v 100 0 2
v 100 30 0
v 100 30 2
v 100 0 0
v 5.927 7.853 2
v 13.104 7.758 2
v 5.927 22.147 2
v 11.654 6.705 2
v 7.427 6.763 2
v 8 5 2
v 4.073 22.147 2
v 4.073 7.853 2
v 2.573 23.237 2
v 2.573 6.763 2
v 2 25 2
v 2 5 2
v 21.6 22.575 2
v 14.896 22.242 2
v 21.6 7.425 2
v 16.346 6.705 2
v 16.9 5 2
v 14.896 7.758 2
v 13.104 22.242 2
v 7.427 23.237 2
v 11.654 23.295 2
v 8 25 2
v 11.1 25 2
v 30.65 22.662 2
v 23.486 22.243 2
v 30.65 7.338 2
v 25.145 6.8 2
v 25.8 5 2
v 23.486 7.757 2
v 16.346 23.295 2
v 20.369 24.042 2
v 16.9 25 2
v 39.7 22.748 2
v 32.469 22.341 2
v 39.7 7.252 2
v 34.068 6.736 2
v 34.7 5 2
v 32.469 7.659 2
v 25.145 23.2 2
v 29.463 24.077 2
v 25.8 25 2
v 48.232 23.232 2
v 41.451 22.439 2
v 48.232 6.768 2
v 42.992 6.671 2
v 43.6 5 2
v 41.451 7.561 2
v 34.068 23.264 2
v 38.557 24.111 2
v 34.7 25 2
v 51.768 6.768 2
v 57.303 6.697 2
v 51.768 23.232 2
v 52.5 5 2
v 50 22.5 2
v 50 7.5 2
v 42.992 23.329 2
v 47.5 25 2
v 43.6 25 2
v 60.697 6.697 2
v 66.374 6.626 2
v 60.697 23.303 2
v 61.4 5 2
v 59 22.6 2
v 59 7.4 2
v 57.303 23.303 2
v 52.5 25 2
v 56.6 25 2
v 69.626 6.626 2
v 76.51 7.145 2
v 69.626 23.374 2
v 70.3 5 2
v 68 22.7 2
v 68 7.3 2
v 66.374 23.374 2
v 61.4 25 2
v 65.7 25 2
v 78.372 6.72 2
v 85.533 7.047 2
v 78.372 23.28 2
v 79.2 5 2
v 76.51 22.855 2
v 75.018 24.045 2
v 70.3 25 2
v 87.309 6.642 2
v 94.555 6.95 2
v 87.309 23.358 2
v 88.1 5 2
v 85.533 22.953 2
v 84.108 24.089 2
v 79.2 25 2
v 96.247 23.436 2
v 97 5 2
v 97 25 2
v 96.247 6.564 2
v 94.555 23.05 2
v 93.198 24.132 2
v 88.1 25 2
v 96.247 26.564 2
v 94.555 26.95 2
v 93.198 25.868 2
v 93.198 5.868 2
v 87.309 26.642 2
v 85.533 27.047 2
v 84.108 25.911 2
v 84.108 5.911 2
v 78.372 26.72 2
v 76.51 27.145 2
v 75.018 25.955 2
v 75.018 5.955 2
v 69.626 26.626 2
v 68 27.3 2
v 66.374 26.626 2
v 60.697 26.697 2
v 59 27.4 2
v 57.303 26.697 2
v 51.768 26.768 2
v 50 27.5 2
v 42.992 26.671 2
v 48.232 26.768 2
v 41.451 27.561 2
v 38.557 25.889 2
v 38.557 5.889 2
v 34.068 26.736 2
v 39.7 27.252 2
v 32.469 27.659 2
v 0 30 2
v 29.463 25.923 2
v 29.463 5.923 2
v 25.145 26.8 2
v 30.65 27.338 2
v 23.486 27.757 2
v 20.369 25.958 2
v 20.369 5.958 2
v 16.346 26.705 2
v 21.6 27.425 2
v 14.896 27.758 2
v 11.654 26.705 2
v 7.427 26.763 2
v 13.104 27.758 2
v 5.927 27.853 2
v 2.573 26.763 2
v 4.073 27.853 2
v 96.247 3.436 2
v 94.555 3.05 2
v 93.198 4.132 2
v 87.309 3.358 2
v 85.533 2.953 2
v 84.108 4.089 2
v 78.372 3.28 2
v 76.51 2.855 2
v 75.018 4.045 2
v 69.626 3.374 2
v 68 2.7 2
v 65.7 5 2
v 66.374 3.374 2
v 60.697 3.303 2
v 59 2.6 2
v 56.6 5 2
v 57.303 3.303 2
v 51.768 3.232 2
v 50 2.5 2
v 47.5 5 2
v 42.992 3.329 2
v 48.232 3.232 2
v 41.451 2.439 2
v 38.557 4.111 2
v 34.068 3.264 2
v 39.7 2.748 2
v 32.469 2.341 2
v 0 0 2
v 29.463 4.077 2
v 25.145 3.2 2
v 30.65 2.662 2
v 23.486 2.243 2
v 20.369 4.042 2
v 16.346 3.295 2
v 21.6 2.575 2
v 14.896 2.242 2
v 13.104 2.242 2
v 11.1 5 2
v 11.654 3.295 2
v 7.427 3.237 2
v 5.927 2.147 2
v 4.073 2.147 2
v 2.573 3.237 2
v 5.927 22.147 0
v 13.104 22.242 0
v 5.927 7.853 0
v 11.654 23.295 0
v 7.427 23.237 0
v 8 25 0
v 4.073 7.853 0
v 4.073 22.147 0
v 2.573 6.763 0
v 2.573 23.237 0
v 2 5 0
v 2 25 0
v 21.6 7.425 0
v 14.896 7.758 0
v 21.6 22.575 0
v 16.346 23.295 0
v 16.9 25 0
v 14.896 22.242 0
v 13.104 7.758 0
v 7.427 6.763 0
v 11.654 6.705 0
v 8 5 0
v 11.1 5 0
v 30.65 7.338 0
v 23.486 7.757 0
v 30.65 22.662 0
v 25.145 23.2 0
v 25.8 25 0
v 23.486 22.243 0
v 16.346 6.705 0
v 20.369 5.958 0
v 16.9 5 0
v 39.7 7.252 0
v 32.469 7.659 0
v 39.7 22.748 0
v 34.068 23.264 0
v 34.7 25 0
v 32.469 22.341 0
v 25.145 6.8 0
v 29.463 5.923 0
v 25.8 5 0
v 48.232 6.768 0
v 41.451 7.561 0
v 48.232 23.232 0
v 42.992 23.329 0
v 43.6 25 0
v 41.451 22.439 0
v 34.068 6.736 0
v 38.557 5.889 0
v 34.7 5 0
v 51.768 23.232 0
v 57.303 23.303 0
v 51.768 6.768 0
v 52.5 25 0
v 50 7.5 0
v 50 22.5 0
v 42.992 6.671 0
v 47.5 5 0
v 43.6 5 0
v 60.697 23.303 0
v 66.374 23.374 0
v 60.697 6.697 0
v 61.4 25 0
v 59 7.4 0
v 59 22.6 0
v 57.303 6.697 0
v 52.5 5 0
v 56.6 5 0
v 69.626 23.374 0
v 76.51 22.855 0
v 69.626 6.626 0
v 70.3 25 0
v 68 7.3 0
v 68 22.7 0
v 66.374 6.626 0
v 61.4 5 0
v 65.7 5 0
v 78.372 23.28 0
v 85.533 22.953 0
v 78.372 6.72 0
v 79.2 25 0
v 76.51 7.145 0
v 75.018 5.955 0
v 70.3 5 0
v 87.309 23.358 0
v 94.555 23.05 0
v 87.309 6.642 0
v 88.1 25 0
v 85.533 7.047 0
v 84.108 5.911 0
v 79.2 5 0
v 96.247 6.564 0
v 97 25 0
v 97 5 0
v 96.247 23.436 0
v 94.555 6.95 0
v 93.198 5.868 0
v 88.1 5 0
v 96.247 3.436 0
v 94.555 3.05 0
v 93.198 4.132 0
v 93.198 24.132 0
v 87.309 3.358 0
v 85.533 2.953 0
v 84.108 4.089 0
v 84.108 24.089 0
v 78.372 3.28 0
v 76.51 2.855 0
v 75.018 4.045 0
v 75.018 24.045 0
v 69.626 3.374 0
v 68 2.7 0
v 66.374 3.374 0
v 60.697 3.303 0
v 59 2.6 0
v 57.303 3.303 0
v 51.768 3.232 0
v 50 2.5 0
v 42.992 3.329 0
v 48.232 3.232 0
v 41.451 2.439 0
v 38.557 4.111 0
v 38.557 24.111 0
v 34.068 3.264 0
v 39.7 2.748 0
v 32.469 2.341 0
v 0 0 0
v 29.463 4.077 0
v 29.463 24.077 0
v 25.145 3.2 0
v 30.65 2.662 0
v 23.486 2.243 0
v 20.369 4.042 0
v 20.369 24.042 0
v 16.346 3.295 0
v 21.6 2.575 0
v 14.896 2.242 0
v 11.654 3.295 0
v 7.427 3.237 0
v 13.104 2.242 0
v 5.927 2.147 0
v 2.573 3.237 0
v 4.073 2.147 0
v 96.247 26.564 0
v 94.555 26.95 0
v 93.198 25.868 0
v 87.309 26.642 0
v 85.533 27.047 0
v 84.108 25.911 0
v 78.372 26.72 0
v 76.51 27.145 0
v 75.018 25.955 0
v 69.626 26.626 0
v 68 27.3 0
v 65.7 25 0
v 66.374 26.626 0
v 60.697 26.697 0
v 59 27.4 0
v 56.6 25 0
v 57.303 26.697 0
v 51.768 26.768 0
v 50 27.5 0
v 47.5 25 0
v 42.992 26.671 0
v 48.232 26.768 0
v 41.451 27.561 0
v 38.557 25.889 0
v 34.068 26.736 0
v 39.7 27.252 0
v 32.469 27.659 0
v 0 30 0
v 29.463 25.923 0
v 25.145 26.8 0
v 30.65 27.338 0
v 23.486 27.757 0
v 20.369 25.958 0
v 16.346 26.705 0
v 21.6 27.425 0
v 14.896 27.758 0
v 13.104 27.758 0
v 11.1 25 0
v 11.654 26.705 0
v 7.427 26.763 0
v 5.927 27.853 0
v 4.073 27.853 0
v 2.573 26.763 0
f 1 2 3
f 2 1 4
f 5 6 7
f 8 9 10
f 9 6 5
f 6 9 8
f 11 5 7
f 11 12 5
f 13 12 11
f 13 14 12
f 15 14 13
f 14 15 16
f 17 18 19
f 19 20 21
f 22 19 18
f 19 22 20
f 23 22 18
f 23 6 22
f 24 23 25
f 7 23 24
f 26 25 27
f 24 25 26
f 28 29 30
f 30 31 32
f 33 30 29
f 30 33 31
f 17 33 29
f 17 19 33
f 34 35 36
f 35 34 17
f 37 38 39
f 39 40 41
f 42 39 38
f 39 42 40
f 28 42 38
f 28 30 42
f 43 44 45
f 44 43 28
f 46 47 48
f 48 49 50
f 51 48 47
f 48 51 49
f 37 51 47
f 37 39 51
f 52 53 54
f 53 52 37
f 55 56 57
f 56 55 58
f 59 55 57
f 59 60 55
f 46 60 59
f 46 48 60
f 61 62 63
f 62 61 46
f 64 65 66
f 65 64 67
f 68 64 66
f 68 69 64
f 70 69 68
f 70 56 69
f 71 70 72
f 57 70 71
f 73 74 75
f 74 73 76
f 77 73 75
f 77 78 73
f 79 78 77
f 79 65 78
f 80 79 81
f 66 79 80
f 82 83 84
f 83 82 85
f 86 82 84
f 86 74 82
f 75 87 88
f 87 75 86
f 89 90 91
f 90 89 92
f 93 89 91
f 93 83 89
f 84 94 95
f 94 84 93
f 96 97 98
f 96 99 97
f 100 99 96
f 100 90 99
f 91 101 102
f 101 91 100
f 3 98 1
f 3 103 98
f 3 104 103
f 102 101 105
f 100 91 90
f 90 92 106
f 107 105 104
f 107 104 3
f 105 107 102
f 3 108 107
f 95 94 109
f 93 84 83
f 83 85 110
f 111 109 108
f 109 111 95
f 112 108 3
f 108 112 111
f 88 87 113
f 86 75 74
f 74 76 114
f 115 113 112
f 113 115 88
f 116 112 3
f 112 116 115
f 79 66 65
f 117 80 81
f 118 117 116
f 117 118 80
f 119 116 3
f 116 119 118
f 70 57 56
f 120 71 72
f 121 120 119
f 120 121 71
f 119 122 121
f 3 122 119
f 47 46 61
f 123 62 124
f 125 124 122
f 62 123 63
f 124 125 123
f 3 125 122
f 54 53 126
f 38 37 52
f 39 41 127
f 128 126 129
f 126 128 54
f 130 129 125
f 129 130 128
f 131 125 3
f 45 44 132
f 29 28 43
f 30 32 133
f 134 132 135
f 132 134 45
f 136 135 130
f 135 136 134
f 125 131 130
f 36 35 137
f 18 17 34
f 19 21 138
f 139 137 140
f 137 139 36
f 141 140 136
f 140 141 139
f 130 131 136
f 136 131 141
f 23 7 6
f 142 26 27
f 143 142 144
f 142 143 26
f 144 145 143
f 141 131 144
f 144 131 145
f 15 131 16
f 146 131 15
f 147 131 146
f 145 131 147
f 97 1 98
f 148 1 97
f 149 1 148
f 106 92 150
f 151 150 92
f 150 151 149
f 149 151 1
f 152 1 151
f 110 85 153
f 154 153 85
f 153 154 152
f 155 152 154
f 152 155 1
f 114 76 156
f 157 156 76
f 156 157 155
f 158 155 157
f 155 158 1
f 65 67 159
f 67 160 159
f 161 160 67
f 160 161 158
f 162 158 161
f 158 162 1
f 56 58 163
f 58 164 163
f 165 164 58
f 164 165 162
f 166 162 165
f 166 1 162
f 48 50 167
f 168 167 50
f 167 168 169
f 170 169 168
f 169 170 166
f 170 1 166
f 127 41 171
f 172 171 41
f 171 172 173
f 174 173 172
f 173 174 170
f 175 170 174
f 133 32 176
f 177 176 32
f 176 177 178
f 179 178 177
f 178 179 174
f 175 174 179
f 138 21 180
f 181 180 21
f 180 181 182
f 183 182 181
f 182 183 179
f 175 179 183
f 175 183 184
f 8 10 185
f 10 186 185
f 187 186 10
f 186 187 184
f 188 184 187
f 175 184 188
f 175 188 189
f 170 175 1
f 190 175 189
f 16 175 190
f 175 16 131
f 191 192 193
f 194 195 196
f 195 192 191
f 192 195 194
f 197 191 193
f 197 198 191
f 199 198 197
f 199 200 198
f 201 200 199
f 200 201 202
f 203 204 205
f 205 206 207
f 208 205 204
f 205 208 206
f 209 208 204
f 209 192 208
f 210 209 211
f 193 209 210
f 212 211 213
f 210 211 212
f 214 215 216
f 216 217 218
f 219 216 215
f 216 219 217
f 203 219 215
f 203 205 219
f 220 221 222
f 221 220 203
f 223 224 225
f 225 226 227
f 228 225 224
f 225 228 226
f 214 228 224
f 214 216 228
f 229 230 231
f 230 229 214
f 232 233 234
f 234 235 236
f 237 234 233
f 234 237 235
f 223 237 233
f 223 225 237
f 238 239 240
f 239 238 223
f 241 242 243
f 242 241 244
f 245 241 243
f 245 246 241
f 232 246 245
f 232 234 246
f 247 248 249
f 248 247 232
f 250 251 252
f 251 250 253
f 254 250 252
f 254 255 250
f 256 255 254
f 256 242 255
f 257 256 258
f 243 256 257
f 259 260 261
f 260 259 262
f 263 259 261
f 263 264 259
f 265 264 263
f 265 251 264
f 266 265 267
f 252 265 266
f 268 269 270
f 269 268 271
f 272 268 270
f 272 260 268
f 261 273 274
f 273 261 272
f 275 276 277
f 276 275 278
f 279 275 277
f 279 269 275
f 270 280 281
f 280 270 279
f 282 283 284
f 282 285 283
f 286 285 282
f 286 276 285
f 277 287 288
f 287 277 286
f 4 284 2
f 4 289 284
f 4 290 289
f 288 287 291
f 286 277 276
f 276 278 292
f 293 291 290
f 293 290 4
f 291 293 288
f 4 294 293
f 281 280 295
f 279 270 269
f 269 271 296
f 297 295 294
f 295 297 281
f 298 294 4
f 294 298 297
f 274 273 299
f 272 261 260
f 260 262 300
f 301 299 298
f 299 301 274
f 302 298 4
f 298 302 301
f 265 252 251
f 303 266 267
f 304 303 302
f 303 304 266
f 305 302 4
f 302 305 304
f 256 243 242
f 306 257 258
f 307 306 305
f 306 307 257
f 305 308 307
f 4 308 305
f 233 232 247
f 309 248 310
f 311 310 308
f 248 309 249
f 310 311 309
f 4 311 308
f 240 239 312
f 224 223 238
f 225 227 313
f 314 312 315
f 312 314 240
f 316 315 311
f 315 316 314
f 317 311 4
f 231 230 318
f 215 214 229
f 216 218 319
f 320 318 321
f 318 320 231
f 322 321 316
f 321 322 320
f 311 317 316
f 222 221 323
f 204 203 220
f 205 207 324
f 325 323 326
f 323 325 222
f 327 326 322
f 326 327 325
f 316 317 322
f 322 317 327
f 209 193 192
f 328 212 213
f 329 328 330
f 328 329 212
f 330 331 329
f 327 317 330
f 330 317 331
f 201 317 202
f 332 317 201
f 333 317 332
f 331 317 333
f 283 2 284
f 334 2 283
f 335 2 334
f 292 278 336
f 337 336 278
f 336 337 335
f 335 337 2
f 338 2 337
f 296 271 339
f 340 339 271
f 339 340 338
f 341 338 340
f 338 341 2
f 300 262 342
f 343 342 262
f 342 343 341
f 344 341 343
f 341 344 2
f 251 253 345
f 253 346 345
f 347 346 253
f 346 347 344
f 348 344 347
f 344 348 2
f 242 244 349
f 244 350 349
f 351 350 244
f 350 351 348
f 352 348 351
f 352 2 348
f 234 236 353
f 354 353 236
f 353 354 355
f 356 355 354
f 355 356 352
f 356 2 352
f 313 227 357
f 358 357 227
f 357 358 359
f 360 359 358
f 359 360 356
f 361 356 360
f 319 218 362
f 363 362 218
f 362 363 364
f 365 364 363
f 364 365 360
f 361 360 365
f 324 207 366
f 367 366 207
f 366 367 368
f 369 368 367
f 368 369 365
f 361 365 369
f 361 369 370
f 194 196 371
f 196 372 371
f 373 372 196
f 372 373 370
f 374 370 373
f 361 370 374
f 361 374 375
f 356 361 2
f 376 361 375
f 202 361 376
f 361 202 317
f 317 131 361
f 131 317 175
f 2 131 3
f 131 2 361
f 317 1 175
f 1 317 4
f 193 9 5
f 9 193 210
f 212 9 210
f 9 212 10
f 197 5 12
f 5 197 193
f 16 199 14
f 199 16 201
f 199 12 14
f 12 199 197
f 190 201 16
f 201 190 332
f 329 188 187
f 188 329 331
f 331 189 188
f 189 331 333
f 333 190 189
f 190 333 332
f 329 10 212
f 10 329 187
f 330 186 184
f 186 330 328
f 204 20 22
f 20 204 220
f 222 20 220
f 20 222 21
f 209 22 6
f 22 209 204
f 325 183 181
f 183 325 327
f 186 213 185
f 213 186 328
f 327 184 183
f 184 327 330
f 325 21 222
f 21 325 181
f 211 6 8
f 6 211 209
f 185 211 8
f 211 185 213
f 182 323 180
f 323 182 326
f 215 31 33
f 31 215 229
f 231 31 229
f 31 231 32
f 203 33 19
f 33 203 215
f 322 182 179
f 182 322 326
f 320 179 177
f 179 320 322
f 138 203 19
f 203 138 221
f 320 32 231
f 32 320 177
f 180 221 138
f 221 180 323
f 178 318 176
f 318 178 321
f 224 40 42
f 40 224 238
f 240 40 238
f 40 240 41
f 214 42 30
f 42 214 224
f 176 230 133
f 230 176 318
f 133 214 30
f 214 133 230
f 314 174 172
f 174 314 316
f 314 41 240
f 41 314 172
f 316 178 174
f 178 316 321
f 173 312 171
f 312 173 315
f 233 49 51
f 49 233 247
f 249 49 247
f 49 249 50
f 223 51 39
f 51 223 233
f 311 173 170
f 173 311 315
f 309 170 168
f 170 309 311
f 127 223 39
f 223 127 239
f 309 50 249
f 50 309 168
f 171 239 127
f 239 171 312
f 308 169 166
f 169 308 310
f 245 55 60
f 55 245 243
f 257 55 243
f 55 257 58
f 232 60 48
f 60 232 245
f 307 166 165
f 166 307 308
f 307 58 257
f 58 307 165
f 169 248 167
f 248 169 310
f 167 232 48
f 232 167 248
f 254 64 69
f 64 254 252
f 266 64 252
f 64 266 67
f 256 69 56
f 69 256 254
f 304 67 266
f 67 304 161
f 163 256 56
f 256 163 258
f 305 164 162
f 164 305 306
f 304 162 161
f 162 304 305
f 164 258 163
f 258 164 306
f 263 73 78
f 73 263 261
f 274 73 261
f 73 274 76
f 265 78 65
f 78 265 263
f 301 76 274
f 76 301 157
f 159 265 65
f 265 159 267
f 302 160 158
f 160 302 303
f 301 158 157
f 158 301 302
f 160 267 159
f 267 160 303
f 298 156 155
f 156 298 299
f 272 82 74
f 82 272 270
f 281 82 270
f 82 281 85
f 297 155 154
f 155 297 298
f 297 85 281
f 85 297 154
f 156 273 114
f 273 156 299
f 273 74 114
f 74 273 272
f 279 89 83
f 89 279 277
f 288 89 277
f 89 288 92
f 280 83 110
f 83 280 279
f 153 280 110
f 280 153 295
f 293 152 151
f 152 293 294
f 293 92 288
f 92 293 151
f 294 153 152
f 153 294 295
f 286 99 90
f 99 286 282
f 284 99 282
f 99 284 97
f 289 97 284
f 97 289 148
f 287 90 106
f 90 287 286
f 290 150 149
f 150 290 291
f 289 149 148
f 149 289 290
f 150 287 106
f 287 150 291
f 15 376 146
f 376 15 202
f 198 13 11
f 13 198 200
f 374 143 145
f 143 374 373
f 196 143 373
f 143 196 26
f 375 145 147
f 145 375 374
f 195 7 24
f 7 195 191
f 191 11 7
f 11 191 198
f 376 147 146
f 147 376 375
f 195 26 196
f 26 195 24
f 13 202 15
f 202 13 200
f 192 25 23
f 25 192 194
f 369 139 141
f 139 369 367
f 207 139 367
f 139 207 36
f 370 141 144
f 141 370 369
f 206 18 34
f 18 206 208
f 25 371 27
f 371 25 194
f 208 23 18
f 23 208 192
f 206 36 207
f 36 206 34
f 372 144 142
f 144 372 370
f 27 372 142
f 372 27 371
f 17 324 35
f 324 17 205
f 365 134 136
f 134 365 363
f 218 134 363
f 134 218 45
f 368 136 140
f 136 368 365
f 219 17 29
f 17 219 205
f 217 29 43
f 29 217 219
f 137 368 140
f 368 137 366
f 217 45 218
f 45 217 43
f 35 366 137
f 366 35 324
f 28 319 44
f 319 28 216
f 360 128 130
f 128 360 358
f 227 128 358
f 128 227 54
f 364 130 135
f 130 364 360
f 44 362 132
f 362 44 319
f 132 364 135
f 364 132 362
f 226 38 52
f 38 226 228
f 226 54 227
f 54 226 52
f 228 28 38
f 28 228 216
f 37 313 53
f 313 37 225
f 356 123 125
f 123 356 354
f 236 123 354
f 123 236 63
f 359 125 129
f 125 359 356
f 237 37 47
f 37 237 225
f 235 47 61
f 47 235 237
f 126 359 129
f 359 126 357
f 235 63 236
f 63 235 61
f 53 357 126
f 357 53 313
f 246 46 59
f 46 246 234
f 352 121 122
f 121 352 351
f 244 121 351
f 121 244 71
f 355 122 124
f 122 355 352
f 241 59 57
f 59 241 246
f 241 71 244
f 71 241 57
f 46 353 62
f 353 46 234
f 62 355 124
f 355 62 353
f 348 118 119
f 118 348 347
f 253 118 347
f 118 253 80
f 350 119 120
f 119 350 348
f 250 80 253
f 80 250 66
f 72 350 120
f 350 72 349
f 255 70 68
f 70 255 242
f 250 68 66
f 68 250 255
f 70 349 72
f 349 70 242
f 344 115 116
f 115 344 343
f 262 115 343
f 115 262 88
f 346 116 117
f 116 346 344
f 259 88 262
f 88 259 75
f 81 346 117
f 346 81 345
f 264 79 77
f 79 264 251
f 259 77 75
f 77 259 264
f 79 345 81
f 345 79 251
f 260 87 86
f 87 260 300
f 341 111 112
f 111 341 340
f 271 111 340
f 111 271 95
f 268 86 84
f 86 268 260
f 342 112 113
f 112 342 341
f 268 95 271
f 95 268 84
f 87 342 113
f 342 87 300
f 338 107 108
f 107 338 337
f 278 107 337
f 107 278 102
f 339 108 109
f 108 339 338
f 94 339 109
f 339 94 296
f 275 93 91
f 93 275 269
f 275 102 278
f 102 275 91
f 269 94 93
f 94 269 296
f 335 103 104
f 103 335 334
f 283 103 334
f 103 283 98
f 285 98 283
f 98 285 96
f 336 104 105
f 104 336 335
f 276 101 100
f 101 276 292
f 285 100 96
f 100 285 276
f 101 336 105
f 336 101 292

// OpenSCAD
difference(){

cube([100,30,2]);

translate([5,5,-1])
cylinder(3,3,3);

translate([14,5,-1])
cylinder(3,2.9,2.9);

translate([23,5,-1])
cylinder(3,2.8,2.8);

translate([32,5,-1])
cylinder(3,2.7,2.7);

translate([41,5,-1])
cylinder(3,2.6,2.6);

translate([50,5,-1])
cylinder(3,2.5,2.5);

translate([59,5,-1])
cylinder(3,2.4,2.4);

translate([68,5,-1])
cylinder(3,2.3,2.3);

translate([77,5,-1])
cylinder(3,2.2,2.2);

translate([86,5,-1])
cylinder(3,2.1,2.1);

translate([95,5,-1])
cylinder(3,2,2);


translate([5,25,-1])
cylinder(3,3,3);

translate([14,25,-1])
cylinder(3,2.9,2.9);

translate([23,25,-1])
cylinder(3,2.8,2.8);

translate([32,25,-1])
cylinder(3,2.7,2.7);

translate([41,25,-1])
cylinder(3,2.6,2.6);

translate([50,25,-1])
cylinder(3,2.5,2.5);

translate([59,25,-1])
cylinder(3,2.4,2.4);

translate([68,25,-1])
cylinder(3,2.3,2.3);

translate([77,25,-1])
cylinder(3,2.2,2.2);

translate([86,25,-1])
cylinder(3,2.1,2.1);

translate([95,25,-1])
cylinder(3,2,2);

}
